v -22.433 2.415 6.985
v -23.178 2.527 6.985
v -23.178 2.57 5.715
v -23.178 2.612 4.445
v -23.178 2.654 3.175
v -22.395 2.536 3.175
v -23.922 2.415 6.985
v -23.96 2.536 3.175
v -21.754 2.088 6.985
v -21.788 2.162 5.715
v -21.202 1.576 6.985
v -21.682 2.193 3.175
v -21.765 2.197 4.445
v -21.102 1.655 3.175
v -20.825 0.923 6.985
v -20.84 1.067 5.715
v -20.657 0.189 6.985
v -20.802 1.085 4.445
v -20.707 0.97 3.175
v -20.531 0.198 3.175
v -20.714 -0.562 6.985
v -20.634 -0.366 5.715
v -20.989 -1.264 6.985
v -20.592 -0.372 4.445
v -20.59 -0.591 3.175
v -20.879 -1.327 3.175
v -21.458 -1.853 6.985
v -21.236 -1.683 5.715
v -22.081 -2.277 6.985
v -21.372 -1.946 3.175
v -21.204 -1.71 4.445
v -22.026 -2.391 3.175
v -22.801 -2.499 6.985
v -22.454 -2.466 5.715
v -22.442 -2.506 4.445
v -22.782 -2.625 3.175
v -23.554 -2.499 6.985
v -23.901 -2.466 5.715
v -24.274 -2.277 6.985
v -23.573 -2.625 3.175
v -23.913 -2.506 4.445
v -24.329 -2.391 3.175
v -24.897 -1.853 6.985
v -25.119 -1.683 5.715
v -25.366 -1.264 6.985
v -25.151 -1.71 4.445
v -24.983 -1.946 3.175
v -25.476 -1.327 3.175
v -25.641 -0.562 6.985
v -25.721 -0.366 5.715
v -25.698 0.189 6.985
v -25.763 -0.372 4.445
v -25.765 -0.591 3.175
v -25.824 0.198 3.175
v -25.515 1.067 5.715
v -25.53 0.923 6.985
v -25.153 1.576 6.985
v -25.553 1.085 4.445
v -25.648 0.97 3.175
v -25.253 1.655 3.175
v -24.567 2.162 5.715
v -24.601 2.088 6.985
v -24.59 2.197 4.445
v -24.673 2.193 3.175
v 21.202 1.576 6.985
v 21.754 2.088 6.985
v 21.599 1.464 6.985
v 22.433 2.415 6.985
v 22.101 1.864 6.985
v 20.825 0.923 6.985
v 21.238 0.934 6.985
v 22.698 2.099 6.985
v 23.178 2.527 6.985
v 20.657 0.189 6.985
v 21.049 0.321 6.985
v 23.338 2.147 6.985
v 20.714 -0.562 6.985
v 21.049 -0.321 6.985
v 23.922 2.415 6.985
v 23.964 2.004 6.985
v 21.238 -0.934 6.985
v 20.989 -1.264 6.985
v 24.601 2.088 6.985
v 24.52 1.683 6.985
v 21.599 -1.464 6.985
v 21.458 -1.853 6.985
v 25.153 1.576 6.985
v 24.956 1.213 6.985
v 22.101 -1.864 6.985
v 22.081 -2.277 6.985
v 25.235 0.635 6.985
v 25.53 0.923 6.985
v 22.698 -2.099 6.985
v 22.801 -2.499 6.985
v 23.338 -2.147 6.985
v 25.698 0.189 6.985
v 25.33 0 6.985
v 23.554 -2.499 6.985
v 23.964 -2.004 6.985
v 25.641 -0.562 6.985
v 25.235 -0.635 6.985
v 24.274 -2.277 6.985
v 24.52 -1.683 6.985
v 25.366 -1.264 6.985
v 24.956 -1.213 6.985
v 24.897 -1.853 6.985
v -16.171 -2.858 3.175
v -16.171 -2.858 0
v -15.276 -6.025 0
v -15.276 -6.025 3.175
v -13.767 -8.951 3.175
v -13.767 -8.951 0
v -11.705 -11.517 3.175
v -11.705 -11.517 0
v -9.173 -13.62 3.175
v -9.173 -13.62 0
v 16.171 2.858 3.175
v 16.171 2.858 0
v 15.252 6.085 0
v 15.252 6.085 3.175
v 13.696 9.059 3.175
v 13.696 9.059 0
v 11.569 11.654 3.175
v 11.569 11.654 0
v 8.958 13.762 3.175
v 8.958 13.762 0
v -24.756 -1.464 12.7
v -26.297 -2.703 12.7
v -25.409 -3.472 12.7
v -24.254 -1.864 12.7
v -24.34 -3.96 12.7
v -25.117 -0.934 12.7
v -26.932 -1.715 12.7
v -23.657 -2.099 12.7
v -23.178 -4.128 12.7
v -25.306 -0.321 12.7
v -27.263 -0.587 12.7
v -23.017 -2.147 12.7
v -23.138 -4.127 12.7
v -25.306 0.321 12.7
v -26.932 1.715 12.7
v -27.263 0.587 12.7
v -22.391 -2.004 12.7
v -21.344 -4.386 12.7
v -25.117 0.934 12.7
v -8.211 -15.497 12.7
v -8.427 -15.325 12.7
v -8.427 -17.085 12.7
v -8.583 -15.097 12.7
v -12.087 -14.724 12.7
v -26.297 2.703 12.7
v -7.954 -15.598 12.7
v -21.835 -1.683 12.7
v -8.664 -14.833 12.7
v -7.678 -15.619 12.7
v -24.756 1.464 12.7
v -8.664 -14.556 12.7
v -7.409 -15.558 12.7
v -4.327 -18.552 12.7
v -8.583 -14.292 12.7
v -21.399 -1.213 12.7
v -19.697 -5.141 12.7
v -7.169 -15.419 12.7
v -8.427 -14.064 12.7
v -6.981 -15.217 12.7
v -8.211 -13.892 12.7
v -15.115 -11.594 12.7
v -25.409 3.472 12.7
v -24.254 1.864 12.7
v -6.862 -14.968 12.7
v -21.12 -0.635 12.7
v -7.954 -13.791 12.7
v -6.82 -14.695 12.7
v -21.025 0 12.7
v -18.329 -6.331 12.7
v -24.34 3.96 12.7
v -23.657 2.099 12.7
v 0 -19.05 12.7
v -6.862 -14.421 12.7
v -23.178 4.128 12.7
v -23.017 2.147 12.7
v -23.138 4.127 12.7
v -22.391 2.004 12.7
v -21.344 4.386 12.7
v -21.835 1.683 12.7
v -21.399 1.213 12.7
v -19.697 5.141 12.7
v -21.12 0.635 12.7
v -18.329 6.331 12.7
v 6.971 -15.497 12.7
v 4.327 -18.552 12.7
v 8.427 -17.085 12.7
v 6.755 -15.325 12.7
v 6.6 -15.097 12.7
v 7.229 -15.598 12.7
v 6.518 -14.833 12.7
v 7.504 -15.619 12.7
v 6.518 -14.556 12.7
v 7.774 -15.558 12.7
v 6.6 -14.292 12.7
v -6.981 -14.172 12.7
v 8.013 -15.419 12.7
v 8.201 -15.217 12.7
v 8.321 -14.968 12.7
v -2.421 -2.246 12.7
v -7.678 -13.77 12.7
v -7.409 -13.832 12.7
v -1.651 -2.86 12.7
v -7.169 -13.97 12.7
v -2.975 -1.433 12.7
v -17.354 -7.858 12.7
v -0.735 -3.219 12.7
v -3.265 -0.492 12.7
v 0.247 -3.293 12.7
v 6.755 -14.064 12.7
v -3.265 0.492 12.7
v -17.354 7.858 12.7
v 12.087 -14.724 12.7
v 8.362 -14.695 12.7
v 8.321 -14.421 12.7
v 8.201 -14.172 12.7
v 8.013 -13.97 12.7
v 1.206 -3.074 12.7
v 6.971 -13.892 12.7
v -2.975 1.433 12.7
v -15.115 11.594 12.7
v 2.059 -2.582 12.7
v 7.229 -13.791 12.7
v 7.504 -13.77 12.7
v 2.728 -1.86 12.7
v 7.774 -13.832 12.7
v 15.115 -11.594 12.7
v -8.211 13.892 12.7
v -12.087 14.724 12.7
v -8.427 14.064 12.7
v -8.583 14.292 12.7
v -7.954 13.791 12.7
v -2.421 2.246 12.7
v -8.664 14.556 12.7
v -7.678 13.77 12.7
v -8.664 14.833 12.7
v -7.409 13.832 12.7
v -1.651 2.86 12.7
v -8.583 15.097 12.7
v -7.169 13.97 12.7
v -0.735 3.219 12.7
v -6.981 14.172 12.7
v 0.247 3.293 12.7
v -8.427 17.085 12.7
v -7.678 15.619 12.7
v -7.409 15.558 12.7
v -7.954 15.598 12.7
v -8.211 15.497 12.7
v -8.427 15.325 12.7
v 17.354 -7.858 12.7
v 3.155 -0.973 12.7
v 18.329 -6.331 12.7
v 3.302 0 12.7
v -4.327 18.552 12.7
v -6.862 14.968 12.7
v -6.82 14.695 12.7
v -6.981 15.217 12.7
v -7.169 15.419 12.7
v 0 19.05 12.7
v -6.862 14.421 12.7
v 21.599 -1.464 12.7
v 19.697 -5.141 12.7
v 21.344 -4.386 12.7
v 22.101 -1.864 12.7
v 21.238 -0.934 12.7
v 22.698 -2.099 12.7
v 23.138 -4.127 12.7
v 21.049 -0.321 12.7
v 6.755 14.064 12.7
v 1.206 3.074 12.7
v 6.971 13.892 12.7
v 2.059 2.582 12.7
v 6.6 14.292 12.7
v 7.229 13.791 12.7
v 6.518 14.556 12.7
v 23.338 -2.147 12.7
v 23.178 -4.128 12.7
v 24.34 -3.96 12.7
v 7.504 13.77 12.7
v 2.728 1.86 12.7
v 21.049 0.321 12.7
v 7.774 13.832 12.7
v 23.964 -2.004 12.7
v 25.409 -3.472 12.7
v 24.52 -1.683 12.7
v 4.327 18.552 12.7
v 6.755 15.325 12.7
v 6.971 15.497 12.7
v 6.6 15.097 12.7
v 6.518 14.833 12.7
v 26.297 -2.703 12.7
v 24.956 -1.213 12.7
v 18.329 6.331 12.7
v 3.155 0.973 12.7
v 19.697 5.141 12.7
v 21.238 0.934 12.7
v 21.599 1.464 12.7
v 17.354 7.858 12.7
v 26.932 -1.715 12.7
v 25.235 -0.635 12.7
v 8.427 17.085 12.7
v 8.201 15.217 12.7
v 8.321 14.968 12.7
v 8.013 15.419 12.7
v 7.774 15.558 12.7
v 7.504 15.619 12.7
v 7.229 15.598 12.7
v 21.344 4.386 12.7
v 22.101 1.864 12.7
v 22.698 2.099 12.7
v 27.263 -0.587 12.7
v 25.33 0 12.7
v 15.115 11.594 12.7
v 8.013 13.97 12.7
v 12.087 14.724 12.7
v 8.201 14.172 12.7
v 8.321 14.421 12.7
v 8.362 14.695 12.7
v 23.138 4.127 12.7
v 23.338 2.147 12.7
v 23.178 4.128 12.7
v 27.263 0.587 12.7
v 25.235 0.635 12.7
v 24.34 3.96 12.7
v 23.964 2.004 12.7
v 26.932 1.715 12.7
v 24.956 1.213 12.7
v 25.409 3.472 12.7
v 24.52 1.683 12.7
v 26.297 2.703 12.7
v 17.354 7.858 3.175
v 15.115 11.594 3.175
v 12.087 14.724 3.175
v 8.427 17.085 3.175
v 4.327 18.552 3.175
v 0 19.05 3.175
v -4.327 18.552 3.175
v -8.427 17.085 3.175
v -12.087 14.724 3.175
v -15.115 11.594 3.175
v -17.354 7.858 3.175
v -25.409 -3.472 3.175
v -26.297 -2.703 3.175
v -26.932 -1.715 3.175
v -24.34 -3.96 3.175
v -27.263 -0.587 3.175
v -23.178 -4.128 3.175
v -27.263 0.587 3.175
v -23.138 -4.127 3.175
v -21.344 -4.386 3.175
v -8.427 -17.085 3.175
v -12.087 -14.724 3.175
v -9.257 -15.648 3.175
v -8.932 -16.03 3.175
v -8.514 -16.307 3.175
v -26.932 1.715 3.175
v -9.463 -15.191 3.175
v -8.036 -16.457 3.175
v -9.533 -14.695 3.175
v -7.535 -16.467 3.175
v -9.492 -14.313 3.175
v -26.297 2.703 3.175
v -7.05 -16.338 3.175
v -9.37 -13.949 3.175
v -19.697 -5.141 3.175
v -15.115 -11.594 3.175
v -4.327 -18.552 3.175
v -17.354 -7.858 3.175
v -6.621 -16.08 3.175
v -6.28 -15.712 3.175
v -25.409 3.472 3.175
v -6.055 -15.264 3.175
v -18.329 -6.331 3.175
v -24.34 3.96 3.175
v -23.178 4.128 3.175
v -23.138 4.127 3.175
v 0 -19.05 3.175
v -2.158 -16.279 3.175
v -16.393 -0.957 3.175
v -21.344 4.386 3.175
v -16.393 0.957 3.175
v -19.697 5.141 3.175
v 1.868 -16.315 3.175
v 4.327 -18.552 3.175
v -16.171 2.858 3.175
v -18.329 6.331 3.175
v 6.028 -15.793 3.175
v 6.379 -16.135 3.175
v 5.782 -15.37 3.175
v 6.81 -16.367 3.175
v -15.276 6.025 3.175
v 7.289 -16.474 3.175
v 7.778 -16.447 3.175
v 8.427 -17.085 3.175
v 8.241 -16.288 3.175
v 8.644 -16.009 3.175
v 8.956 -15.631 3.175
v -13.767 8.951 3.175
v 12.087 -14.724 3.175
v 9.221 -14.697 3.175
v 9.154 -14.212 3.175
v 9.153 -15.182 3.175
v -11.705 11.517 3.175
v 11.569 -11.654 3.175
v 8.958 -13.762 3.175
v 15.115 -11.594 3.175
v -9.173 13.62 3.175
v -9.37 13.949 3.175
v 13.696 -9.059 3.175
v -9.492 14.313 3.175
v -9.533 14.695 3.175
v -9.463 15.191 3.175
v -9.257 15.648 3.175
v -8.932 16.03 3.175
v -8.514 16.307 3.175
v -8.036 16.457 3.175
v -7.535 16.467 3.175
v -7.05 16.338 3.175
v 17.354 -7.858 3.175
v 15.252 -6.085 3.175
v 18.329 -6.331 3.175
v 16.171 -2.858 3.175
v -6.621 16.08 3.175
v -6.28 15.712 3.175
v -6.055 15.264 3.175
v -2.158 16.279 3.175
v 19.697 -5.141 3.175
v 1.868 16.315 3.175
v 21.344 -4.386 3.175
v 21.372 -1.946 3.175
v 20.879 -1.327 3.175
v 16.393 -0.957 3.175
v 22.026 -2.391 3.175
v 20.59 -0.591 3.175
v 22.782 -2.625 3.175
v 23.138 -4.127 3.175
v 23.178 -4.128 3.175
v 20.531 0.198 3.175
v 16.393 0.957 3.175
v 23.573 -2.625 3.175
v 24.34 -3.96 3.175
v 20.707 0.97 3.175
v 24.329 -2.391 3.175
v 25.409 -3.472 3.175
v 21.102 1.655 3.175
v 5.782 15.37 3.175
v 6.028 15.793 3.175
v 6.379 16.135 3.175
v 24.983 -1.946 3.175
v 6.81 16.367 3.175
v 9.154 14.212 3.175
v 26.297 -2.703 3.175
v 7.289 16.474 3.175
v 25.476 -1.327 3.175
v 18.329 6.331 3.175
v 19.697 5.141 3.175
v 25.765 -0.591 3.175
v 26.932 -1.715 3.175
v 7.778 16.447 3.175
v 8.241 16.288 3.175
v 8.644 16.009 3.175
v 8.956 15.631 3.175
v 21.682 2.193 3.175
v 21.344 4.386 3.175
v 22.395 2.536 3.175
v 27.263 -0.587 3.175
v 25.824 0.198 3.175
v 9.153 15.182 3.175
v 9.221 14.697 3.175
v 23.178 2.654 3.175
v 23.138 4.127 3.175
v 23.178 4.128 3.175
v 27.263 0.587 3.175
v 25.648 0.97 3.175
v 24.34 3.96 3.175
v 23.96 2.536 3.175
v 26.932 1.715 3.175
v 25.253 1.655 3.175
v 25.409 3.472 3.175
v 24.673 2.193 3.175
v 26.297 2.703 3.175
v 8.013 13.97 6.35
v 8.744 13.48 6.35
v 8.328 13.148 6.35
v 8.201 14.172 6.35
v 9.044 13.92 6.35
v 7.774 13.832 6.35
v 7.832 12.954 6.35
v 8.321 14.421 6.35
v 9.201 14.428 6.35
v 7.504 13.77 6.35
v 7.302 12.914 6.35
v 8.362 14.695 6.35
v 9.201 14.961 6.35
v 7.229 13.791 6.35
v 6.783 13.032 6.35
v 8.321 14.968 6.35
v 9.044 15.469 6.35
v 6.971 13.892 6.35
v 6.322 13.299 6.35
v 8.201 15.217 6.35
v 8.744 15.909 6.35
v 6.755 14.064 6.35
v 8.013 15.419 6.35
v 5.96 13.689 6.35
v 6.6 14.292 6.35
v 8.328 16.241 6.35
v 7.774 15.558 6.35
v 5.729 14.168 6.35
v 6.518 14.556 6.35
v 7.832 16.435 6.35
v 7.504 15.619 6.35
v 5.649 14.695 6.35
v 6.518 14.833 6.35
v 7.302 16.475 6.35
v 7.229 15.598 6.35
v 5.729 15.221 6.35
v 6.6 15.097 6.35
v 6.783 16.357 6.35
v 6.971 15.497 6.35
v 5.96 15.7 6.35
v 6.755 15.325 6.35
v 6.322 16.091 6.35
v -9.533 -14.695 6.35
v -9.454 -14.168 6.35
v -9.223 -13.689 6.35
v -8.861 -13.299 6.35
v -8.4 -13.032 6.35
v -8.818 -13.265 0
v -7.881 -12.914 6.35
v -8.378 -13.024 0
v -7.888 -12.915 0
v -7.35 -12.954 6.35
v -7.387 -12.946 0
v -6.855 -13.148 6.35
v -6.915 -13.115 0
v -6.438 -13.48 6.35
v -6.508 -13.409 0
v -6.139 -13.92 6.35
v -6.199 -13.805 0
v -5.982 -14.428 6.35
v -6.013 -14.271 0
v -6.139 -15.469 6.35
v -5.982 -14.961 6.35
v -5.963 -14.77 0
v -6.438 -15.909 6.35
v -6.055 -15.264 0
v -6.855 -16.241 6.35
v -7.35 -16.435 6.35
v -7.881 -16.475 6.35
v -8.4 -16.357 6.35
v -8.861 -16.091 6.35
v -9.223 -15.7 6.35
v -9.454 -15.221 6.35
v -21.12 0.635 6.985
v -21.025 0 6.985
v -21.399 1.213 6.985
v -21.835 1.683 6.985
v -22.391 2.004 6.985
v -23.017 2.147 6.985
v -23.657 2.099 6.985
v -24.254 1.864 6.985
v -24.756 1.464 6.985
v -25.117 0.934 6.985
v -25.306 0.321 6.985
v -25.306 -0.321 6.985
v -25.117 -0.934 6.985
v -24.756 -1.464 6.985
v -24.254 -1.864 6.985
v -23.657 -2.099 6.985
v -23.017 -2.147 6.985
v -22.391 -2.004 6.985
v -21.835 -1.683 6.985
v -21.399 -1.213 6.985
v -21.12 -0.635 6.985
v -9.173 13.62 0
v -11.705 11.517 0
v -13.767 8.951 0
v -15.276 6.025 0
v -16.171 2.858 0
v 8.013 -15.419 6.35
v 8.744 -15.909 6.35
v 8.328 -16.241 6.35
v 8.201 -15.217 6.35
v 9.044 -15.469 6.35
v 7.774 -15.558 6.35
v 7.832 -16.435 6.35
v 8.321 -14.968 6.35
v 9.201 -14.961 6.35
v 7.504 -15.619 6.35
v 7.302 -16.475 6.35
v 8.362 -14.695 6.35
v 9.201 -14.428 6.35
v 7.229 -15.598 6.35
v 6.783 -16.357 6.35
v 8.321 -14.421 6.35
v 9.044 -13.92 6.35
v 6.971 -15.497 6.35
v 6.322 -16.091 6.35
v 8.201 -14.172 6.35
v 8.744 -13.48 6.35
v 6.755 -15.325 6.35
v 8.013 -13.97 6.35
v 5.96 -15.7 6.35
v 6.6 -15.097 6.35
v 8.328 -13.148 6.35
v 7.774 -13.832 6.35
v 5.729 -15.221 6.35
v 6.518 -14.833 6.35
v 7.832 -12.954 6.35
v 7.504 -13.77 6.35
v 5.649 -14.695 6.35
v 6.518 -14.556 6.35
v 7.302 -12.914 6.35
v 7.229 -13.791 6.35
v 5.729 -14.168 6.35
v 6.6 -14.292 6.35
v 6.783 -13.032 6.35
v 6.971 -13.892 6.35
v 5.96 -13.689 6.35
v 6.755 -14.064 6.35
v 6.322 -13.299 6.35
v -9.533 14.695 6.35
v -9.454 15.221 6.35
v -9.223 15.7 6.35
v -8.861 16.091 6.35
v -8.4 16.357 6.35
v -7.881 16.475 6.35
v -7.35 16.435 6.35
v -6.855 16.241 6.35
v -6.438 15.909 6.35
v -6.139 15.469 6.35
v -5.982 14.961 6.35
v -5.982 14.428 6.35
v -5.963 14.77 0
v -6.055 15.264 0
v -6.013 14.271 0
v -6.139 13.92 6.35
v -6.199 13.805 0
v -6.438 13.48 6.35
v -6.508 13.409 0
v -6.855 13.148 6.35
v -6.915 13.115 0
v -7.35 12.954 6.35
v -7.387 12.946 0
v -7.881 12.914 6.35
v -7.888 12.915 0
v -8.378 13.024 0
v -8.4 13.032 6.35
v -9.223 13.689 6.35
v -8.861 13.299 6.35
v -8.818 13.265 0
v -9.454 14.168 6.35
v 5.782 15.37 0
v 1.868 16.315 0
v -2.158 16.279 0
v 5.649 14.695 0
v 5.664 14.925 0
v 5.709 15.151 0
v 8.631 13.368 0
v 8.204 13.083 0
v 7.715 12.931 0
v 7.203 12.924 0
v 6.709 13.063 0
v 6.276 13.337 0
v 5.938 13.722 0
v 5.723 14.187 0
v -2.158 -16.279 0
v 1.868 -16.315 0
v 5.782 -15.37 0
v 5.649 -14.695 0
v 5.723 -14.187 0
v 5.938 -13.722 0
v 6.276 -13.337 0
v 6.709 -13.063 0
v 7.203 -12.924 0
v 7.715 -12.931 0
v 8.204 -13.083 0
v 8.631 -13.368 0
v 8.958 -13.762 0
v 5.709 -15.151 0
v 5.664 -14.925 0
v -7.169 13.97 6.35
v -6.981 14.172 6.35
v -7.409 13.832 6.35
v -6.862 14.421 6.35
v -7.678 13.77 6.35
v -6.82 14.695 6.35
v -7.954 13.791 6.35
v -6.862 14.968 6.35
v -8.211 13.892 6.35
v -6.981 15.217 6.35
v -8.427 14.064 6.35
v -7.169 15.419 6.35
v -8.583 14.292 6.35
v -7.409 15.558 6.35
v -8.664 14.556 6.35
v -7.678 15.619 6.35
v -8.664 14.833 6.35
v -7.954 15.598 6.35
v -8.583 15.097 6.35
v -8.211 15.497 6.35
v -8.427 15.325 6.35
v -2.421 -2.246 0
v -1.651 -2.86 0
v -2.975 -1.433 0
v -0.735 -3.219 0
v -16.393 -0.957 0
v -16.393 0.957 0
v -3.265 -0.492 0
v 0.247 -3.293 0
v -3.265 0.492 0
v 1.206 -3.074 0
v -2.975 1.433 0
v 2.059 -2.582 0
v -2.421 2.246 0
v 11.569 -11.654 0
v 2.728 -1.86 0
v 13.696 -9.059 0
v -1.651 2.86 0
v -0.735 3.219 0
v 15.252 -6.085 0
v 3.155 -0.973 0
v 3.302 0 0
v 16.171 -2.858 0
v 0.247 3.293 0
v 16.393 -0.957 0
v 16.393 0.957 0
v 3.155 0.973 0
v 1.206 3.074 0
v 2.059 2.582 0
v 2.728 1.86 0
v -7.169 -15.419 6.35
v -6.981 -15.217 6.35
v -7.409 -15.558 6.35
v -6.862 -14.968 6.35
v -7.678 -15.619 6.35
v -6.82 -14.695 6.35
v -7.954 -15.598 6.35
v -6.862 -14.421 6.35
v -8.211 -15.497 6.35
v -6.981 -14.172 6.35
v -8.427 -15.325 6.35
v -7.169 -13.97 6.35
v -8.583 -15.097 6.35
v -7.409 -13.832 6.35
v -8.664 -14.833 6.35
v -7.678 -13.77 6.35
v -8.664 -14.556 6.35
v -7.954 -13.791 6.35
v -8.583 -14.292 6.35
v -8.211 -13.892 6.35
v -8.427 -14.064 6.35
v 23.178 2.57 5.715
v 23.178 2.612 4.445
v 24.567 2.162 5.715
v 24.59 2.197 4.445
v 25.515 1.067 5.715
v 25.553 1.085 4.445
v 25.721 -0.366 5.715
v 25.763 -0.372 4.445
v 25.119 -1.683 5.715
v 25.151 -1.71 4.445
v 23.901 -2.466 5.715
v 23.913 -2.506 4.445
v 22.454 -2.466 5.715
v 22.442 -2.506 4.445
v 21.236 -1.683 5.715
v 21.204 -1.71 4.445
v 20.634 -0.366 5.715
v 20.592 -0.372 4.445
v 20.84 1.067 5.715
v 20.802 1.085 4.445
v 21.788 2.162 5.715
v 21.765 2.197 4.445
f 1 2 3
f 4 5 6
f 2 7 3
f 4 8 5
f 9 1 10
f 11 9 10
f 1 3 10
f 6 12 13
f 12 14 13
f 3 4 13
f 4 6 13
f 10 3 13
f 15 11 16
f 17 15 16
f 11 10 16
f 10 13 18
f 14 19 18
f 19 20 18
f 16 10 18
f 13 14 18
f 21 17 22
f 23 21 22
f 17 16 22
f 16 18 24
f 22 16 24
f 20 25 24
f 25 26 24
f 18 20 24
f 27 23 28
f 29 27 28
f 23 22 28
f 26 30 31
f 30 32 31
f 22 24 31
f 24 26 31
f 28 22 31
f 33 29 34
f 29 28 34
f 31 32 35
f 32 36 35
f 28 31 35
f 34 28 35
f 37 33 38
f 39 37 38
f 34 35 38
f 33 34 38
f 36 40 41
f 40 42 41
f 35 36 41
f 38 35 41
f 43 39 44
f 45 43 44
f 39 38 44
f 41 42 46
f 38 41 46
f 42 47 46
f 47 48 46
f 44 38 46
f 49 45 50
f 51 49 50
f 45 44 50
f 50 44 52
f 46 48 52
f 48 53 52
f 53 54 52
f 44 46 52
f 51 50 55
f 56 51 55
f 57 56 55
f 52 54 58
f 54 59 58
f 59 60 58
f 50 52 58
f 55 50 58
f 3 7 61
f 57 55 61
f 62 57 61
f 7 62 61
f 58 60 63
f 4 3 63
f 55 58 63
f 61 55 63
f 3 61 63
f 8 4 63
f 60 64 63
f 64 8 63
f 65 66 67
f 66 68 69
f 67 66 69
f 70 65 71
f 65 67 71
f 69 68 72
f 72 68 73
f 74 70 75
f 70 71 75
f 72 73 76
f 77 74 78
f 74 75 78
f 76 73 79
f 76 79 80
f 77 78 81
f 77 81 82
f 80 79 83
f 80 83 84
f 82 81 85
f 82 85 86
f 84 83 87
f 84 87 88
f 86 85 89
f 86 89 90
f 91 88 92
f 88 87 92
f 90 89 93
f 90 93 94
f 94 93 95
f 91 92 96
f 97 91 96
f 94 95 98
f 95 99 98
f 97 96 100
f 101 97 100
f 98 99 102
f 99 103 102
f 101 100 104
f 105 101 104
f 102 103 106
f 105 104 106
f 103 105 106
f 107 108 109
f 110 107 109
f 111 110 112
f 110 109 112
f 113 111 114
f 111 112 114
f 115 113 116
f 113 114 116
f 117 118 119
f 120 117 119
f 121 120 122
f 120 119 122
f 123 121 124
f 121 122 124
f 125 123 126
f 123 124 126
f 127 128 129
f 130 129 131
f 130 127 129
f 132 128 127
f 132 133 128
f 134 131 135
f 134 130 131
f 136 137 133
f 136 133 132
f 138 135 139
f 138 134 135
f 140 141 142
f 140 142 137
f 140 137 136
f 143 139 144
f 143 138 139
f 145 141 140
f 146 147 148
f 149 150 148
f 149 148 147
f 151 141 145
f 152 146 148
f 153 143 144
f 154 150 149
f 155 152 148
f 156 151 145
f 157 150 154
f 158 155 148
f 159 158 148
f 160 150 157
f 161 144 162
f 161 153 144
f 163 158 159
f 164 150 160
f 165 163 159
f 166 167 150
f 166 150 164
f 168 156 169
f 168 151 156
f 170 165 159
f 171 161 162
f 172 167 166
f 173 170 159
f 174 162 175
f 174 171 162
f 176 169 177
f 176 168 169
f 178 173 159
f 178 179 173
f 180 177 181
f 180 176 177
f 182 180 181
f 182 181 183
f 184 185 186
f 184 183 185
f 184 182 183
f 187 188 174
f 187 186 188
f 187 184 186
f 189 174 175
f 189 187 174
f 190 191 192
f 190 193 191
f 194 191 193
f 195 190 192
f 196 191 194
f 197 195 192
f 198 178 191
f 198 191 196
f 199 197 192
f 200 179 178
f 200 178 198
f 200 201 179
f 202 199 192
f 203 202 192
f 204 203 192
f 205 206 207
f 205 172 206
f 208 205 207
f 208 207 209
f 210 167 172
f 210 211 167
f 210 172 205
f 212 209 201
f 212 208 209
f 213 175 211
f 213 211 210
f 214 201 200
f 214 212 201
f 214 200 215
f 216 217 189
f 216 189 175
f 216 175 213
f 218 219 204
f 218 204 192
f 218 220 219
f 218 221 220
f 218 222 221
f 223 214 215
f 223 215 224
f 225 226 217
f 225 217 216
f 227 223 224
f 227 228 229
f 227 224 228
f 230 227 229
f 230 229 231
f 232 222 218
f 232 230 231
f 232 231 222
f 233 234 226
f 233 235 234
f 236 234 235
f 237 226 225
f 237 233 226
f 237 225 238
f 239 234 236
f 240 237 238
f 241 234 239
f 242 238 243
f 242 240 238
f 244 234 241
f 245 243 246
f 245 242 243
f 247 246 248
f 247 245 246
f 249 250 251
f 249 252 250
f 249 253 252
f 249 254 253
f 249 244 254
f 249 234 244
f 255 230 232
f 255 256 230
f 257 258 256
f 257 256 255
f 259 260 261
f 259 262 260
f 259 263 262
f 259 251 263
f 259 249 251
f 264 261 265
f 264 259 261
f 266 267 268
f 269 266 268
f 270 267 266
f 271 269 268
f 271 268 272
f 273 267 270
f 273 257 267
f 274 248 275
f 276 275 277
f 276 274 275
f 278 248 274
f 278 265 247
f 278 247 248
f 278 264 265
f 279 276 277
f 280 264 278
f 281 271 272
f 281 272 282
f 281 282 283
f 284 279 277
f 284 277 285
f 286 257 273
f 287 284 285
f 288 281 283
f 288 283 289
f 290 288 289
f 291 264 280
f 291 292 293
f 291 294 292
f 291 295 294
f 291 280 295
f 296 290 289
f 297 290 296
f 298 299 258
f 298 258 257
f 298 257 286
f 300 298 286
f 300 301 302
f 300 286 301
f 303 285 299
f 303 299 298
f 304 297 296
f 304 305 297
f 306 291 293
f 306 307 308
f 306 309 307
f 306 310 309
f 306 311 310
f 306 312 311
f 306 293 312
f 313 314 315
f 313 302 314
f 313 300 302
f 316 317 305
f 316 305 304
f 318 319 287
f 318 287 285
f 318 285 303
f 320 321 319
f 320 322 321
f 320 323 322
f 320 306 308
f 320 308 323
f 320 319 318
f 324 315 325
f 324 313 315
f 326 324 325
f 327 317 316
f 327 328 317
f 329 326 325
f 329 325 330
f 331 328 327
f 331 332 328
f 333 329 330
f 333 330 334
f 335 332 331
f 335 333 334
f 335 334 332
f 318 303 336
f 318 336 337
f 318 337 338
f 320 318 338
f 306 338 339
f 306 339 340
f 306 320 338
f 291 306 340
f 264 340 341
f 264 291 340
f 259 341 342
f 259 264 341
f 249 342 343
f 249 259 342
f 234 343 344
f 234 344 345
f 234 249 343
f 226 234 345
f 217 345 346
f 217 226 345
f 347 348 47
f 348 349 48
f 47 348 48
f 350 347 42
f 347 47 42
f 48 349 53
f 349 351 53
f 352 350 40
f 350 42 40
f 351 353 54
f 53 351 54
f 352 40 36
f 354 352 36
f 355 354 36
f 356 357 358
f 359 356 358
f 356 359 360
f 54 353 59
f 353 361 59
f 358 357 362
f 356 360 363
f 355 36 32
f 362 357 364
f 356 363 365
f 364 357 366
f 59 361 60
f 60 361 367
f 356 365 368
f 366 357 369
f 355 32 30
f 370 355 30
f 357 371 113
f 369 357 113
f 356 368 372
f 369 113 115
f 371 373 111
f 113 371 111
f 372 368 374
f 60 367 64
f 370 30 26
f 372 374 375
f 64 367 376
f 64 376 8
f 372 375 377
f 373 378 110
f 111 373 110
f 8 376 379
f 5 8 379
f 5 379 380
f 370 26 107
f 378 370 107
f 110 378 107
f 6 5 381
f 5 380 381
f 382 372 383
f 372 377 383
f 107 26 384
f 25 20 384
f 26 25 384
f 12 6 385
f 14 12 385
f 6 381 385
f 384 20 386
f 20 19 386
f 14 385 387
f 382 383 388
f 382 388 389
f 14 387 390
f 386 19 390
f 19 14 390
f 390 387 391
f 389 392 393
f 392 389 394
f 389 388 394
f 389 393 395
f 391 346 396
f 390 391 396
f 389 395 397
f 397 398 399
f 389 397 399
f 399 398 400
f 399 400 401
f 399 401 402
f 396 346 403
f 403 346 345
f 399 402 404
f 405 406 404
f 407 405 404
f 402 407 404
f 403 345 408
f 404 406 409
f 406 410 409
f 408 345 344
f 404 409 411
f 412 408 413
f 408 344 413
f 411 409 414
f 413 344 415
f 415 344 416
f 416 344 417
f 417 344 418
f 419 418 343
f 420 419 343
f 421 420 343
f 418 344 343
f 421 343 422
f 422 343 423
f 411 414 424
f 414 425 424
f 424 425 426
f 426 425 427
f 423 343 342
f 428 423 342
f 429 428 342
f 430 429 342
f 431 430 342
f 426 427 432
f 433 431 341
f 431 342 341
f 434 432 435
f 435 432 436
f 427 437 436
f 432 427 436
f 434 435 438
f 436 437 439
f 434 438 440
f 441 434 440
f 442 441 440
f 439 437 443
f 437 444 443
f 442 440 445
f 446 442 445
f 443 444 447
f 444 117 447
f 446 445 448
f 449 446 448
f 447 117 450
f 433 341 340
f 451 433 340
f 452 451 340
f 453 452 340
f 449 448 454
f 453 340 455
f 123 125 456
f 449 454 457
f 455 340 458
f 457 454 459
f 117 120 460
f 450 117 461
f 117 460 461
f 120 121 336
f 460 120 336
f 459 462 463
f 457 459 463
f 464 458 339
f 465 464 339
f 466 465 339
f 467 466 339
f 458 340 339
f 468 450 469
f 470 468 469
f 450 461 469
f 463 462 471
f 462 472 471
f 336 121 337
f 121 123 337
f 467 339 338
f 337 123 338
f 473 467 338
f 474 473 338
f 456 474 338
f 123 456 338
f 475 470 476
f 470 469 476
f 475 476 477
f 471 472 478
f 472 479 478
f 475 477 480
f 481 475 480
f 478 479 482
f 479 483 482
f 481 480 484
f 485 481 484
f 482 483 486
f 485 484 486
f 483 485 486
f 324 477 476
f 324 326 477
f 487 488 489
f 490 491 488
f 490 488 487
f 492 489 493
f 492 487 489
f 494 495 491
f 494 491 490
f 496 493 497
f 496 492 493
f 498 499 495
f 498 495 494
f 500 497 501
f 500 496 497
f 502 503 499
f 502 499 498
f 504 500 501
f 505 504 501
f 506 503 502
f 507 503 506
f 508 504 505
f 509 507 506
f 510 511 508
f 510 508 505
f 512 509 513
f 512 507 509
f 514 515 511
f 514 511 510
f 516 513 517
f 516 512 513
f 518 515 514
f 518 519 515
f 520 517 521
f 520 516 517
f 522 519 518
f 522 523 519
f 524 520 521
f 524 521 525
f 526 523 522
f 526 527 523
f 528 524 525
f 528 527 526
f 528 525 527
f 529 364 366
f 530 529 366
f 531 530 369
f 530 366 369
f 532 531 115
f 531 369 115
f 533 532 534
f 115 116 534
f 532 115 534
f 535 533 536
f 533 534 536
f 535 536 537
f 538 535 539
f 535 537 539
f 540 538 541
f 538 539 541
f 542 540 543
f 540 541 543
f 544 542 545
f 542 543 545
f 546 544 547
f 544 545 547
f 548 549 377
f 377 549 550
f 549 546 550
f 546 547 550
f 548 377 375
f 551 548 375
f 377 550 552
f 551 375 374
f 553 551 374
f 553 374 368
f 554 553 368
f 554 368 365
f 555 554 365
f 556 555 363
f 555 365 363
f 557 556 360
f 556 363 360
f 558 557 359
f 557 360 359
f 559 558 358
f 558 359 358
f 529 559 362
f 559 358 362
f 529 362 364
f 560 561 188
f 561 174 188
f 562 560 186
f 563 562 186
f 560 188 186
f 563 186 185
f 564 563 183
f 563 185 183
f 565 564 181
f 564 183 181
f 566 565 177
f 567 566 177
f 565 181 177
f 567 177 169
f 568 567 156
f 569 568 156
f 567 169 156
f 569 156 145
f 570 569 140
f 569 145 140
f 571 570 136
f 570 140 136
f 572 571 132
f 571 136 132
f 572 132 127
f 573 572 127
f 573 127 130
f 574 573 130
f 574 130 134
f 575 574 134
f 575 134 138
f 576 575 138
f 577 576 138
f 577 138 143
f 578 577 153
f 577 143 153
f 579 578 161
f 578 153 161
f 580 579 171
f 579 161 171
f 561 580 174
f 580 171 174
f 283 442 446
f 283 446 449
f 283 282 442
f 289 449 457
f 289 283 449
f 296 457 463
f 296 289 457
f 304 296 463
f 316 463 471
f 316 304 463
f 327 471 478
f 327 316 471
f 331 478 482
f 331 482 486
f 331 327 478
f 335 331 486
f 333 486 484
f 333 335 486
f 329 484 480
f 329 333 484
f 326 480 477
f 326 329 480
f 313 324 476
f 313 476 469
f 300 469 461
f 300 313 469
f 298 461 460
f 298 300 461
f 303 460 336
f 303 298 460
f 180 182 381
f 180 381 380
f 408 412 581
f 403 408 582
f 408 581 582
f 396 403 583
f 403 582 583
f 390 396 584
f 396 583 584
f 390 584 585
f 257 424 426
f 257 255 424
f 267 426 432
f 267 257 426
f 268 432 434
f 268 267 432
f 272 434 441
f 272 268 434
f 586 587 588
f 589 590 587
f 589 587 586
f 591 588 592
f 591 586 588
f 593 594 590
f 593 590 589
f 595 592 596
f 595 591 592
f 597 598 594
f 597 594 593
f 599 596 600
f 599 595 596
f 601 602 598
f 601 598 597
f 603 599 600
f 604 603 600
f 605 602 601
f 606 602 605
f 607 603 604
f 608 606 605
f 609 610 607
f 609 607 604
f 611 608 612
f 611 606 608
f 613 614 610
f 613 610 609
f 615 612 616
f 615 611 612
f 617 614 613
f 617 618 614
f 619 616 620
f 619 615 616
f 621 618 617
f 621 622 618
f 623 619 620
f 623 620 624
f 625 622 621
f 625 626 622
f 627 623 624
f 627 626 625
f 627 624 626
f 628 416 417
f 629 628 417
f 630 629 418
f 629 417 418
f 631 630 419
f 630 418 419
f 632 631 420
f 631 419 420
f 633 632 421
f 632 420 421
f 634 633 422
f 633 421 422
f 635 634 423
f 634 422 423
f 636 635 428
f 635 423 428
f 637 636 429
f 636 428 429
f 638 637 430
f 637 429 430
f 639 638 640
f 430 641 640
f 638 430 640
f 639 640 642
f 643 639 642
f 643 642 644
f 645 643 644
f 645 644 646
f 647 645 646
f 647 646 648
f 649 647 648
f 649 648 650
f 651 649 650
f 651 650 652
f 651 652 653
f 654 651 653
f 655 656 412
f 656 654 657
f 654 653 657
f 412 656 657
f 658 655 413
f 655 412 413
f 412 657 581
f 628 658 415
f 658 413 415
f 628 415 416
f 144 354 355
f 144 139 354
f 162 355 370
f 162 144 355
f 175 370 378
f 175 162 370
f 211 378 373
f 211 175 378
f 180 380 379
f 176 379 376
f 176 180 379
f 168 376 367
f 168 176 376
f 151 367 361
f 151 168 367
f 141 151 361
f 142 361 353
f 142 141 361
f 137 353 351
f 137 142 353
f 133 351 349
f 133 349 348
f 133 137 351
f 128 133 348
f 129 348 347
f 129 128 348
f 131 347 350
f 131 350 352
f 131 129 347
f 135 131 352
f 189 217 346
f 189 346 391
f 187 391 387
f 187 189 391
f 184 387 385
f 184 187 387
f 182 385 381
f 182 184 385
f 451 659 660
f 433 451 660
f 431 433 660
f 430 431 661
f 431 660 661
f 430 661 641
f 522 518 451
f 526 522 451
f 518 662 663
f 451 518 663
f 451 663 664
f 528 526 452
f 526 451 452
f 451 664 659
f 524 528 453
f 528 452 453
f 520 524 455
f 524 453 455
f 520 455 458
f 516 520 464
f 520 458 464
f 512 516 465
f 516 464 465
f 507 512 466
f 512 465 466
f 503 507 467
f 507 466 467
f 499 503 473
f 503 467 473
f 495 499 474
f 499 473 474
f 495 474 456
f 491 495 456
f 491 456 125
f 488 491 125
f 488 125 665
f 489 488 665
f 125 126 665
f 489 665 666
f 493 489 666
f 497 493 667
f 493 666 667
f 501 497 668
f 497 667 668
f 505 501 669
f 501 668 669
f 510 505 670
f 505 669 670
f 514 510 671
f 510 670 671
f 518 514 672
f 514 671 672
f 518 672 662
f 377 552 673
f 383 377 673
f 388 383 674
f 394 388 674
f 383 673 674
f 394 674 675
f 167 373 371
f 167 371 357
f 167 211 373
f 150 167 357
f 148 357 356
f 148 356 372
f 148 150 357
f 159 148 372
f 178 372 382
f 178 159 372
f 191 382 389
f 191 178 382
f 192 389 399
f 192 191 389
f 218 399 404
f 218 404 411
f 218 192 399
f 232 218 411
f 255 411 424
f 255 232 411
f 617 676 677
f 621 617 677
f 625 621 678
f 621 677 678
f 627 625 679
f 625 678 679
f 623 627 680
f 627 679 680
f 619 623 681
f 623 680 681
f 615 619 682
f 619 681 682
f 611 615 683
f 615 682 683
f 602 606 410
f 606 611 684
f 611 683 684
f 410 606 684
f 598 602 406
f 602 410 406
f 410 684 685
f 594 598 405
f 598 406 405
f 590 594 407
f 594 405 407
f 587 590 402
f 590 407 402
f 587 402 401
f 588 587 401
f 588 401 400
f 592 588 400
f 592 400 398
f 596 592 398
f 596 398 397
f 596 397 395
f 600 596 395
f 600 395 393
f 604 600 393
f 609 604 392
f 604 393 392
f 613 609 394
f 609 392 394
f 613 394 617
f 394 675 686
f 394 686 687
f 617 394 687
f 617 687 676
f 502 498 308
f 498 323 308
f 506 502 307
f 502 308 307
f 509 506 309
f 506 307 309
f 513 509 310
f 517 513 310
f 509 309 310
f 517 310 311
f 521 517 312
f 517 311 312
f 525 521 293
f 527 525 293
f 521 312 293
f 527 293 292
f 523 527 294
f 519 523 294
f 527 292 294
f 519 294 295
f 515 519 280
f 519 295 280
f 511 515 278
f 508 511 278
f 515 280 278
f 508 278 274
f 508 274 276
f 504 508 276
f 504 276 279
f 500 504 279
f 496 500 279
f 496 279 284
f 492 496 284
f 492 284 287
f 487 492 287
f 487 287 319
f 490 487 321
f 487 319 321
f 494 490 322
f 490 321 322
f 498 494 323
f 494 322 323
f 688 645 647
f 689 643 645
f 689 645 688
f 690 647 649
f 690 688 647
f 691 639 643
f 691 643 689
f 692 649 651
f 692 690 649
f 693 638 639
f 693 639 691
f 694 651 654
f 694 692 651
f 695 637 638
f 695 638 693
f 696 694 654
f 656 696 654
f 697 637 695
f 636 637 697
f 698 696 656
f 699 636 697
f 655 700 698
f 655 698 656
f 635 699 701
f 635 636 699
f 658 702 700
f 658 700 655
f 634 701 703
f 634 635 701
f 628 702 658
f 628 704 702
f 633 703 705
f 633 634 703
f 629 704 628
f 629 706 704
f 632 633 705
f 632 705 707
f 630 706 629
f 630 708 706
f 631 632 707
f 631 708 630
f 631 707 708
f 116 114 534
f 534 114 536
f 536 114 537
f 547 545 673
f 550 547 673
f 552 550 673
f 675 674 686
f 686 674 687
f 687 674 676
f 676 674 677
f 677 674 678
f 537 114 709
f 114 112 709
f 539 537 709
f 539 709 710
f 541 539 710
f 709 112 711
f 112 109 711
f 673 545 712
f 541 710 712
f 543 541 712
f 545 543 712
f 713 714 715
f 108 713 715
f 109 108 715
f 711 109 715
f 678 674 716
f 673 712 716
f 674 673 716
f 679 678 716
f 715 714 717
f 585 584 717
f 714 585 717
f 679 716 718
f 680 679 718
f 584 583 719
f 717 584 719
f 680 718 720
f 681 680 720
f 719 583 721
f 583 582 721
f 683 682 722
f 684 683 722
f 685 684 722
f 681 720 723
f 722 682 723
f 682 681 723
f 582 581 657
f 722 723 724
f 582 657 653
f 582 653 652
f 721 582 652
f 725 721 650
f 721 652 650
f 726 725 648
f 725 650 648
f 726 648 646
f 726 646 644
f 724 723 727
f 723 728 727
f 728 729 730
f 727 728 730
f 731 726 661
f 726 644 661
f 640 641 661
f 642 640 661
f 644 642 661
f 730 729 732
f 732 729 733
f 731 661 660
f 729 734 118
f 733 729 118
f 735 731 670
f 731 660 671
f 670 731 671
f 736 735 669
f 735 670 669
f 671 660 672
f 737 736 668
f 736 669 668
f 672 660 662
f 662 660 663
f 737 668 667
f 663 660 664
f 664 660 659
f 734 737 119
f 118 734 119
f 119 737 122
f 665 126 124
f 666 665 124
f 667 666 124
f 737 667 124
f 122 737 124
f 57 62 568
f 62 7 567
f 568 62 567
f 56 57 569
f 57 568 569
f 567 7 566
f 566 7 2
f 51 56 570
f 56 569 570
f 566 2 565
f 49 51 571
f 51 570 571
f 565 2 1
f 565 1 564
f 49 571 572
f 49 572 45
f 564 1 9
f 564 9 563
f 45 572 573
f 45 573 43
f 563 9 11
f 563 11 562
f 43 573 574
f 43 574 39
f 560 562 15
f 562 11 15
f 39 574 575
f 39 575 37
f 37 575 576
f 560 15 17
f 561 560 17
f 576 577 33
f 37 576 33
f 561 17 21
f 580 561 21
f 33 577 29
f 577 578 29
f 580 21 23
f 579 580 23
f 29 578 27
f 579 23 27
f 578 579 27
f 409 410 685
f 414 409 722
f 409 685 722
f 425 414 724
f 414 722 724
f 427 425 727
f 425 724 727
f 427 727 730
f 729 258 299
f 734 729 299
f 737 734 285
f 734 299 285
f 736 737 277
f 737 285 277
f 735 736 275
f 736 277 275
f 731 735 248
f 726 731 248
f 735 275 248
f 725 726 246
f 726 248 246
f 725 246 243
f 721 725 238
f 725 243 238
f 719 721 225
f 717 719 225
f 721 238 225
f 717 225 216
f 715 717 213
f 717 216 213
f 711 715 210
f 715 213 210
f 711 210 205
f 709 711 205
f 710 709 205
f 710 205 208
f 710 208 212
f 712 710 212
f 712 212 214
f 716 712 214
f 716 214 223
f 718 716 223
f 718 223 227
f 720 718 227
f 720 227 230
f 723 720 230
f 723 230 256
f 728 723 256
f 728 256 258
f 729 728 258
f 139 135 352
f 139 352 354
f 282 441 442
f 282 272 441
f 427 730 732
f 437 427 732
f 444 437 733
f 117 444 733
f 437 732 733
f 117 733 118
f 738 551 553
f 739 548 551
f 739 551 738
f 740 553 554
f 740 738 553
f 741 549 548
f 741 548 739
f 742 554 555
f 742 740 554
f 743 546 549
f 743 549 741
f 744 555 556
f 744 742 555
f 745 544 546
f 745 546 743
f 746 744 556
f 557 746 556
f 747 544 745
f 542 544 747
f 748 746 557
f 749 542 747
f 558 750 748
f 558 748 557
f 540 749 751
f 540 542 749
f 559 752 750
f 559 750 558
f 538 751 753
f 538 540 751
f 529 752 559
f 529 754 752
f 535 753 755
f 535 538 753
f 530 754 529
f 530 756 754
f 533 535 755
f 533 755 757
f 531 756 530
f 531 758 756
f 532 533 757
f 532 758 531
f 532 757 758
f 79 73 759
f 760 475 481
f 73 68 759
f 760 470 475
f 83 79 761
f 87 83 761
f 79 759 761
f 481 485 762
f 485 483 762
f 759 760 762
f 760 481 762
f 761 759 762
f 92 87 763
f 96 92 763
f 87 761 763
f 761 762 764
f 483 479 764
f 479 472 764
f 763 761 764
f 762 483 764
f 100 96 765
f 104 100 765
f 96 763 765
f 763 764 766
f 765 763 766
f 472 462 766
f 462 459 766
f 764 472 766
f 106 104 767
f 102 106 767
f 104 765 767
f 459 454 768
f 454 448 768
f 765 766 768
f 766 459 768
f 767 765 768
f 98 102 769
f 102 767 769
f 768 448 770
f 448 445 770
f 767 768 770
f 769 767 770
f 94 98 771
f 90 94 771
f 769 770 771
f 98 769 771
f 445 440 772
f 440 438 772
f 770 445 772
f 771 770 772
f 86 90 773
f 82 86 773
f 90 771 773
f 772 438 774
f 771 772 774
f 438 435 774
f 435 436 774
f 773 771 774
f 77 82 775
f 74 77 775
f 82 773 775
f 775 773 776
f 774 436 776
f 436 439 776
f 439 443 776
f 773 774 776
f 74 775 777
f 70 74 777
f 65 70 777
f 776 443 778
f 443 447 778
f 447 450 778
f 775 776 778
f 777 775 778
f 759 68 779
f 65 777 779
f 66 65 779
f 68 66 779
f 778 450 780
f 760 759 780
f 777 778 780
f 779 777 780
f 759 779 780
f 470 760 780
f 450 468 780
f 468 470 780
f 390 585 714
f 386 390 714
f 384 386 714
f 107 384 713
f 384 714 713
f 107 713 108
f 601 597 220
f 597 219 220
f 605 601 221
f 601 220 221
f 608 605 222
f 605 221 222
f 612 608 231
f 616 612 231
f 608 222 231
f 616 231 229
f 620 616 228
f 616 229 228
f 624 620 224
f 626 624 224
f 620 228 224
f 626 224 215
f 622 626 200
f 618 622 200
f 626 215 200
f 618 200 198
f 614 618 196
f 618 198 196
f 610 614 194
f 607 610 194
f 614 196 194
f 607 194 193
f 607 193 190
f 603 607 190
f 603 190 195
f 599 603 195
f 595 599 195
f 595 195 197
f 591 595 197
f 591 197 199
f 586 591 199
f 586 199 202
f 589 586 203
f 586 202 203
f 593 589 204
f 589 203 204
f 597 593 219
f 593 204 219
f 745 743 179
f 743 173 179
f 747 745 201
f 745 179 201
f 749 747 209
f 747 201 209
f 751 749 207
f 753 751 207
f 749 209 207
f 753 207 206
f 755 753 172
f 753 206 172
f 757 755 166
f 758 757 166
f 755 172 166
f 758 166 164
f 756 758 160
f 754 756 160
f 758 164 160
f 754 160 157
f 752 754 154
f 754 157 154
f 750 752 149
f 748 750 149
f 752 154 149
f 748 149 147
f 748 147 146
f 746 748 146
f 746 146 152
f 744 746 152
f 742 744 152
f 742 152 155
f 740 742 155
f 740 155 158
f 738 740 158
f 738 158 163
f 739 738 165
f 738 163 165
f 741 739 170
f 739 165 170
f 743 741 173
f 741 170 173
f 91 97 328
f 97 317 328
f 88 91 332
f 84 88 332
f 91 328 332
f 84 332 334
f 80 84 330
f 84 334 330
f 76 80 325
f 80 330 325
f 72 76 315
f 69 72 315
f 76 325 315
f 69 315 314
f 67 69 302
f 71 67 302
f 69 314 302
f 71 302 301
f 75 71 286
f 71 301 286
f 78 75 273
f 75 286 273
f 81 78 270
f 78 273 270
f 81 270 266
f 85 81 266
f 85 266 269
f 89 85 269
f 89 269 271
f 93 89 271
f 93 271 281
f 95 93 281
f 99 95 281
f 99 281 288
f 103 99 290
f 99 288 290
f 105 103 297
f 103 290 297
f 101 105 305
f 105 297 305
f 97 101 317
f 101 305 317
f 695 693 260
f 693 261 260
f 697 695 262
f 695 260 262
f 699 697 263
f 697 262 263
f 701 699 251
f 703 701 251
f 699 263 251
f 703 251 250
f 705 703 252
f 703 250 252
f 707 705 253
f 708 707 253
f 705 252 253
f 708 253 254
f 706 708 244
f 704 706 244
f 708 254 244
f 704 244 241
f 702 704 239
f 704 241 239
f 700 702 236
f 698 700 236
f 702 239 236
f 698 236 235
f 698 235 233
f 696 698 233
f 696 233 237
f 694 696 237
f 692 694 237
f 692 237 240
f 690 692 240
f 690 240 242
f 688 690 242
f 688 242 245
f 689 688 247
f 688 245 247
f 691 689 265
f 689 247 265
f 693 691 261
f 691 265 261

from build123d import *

# Parameters (mm, degrees)
SKETCH1_R                                       = 3.302
BOSS_EXTRUDE1_DEPTH                             = 6.35
SKETCH2_R                                       = 16.4211
BOSS_EXTRUDE3_DEPTH                             = 6.35
BOSS_EXTRUDE3_DEPTH_BACK                        = 3.175
F_6_CLEARANCE_HOLE1_D                           = 4.3053
F_6_CLEARANCE_HOLE1_DEPTH                       = 9.525
F_6_PLASTIC_INSERT_AT_2_COUNT                   = 2
F_6_PLASTIC_INSERT_AT_2_PITCH                   = 46.355
BOSS_EXTRUDE4_REACH                             = 14.7
SKETCH22_R                                      = 16.4211
SKETCH22_R_2                                    = 3.302
CBORE_FOR_0_PAN_HEAD_MACHINE_SCREW1_D           = 1.8542
CBORE_FOR_0_PAN_HEAD_MACHINE_SCREW1_CBORE_D     = 3.57124
CBORE_FOR_0_PAN_HEAD_MACHINE_SCREW1_CBORE_DEPTH = 6.35


with BuildPart() as part:
    # Sketch1 → Boss-Extrude1 (new body)
    with BuildSketch(Plane.XY):
        with BuildLine():
            ThreePointArc((16.170566439, -2.8575), (16.4211, 0), (16.170566439, 2.8575))
            ThreePointArc((16.170566439, 2.8575), (0, 16.4211), (-16.170566439, 2.8575))
            ThreePointArc((-16.170566439, 2.8575), (-16.4211, 0), (-16.170566439, -2.8575))
            ThreePointArc((-16.170566439, -2.8575), (0, -16.4211), (16.170566439, -2.8575))
        make_face()
        Circle(SKETCH1_R, mode=Mode.SUBTRACT)
    extrude(amount=BOSS_EXTRUDE1_DEPTH)

    # Sketch2 → Boss-Extrude3 (add, two sides)
    with BuildSketch(Plane.XY.offset(6.35)) as boss_extrude3_sk:
        with BuildLine():
            Line((23.1775, 4.1275), (23.138323054, 4.1275))
            ThreePointArc((23.138323054, 4.1275), (19.696705066, 5.14104372), (17.35374229, 7.858125))
            ThreePointArc((17.35374229, 7.858125), (0, 19.05), (-17.35374229, 7.858125))
            ThreePointArc((-17.35374229, 7.858125), (-19.696705066, 5.14104372), (-23.138323054, 4.1275))
            Line((-23.138323054, 4.1275), (-23.1775, 4.1275))
            ThreePointArc((-23.1775, 4.1275), (-27.305, 0), (-23.1775, -4.1275))
            Line((-23.1775, -4.1275), (-23.138323054, -4.1275))
            ThreePointArc((-23.138323054, -4.1275), (-19.696705066, -5.14104372), (-17.35374229, -7.858125))
            ThreePointArc((-17.35374229, -7.858125), (0, -19.05), (17.35374229, -7.858125))
            ThreePointArc((17.35374229, -7.858125), (19.696705066, -5.14104372), (23.138323054, -4.1275))
            Line((23.138323054, -4.1275), (23.1775, -4.1275))
            ThreePointArc((23.1775, -4.1275), (27.305, 0), (23.1775, 4.1275))
        make_face()
        Circle(SKETCH2_R, mode=Mode.SUBTRACT)
    extrude(amount=BOSS_EXTRUDE3_DEPTH)
    extrude(boss_extrude3_sk.sketch, amount=-BOSS_EXTRUDE3_DEPTH_BACK)

    # #6 Clearance Hole1
    with Locations(Plane(origin=(-22.699598292, 0.104385938, 3.175), x_dir=(-1, 0, 0), z_dir=(0, 0, -1))):
        with Locations((-45.877098292, -0.104385938), (0.477901708, -0.104385938)):
            Hole(F_6_CLEARANCE_HOLE1_D / 2, depth=F_6_CLEARANCE_HOLE1_DEPTH)

    # Sketch5 → #6 Plastic Insert (revolve, cut)
    with BuildSketch(Plane(origin=(23.1775, 0, 3.175), x_dir=(0, 1, 0), z_dir=(1, 0, 0))):
        Polygon((0, 0), (0, 3.81), (2.5273, 3.81), (2.6543, 0), align=None)
    f_6_plastic_insert = revolve(axis=Axis((23.1775, 0, 113.175), (0, 0, -1)), mode=Mode.SUBTRACT)

    # #6 Plastic Insert at 2: #6 Plastic Insert ×2
    with Locations(*[(-i * F_6_PLASTIC_INSERT_AT_2_PITCH, 0, 0) for i in range(1, F_6_PLASTIC_INSERT_AT_2_COUNT)]):
        add(f_6_plastic_insert, mode=Mode.SUBTRACT)

    # Sketch22 → Boss-Extrude4 (add, up to next)
    with BuildSketch(Plane.XY.offset(12.7), mode=Mode.PRIVATE) as boss_extrude4_sk1:
        Circle(SKETCH22_R)
        Circle(SKETCH22_R_2, mode=Mode.SUBTRACT)
    boss_extrude4_tool1 = extrude(boss_extrude4_sk1.sketch, amount=-BOSS_EXTRUDE4_REACH, mode=Mode.PRIVATE) - part.part
    add(boss_extrude4_tool1.solids().sort_by_distance((-15.956641, 0, 12.7))[0])

    # CBORE for #0 Pan Head Machine Screw1 (through all)
    with Locations(Plane(origin=(0, 0, 0), x_dir=(-1, 0, 0), z_dir=(0, 0, -1))):
        with Locations((-7.435045578, 14.69458661), (7.747421379, 14.69458661), (7.747421379, -14.69458661), (-7.435045578, -14.69458661)):
            CounterBoreHole(CBORE_FOR_0_PAN_HEAD_MACHINE_SCREW1_D / 2, CBORE_FOR_0_PAN_HEAD_MACHINE_SCREW1_CBORE_D / 2, CBORE_FOR_0_PAN_HEAD_MACHINE_SCREW1_CBORE_DEPTH)


solid = part.part
